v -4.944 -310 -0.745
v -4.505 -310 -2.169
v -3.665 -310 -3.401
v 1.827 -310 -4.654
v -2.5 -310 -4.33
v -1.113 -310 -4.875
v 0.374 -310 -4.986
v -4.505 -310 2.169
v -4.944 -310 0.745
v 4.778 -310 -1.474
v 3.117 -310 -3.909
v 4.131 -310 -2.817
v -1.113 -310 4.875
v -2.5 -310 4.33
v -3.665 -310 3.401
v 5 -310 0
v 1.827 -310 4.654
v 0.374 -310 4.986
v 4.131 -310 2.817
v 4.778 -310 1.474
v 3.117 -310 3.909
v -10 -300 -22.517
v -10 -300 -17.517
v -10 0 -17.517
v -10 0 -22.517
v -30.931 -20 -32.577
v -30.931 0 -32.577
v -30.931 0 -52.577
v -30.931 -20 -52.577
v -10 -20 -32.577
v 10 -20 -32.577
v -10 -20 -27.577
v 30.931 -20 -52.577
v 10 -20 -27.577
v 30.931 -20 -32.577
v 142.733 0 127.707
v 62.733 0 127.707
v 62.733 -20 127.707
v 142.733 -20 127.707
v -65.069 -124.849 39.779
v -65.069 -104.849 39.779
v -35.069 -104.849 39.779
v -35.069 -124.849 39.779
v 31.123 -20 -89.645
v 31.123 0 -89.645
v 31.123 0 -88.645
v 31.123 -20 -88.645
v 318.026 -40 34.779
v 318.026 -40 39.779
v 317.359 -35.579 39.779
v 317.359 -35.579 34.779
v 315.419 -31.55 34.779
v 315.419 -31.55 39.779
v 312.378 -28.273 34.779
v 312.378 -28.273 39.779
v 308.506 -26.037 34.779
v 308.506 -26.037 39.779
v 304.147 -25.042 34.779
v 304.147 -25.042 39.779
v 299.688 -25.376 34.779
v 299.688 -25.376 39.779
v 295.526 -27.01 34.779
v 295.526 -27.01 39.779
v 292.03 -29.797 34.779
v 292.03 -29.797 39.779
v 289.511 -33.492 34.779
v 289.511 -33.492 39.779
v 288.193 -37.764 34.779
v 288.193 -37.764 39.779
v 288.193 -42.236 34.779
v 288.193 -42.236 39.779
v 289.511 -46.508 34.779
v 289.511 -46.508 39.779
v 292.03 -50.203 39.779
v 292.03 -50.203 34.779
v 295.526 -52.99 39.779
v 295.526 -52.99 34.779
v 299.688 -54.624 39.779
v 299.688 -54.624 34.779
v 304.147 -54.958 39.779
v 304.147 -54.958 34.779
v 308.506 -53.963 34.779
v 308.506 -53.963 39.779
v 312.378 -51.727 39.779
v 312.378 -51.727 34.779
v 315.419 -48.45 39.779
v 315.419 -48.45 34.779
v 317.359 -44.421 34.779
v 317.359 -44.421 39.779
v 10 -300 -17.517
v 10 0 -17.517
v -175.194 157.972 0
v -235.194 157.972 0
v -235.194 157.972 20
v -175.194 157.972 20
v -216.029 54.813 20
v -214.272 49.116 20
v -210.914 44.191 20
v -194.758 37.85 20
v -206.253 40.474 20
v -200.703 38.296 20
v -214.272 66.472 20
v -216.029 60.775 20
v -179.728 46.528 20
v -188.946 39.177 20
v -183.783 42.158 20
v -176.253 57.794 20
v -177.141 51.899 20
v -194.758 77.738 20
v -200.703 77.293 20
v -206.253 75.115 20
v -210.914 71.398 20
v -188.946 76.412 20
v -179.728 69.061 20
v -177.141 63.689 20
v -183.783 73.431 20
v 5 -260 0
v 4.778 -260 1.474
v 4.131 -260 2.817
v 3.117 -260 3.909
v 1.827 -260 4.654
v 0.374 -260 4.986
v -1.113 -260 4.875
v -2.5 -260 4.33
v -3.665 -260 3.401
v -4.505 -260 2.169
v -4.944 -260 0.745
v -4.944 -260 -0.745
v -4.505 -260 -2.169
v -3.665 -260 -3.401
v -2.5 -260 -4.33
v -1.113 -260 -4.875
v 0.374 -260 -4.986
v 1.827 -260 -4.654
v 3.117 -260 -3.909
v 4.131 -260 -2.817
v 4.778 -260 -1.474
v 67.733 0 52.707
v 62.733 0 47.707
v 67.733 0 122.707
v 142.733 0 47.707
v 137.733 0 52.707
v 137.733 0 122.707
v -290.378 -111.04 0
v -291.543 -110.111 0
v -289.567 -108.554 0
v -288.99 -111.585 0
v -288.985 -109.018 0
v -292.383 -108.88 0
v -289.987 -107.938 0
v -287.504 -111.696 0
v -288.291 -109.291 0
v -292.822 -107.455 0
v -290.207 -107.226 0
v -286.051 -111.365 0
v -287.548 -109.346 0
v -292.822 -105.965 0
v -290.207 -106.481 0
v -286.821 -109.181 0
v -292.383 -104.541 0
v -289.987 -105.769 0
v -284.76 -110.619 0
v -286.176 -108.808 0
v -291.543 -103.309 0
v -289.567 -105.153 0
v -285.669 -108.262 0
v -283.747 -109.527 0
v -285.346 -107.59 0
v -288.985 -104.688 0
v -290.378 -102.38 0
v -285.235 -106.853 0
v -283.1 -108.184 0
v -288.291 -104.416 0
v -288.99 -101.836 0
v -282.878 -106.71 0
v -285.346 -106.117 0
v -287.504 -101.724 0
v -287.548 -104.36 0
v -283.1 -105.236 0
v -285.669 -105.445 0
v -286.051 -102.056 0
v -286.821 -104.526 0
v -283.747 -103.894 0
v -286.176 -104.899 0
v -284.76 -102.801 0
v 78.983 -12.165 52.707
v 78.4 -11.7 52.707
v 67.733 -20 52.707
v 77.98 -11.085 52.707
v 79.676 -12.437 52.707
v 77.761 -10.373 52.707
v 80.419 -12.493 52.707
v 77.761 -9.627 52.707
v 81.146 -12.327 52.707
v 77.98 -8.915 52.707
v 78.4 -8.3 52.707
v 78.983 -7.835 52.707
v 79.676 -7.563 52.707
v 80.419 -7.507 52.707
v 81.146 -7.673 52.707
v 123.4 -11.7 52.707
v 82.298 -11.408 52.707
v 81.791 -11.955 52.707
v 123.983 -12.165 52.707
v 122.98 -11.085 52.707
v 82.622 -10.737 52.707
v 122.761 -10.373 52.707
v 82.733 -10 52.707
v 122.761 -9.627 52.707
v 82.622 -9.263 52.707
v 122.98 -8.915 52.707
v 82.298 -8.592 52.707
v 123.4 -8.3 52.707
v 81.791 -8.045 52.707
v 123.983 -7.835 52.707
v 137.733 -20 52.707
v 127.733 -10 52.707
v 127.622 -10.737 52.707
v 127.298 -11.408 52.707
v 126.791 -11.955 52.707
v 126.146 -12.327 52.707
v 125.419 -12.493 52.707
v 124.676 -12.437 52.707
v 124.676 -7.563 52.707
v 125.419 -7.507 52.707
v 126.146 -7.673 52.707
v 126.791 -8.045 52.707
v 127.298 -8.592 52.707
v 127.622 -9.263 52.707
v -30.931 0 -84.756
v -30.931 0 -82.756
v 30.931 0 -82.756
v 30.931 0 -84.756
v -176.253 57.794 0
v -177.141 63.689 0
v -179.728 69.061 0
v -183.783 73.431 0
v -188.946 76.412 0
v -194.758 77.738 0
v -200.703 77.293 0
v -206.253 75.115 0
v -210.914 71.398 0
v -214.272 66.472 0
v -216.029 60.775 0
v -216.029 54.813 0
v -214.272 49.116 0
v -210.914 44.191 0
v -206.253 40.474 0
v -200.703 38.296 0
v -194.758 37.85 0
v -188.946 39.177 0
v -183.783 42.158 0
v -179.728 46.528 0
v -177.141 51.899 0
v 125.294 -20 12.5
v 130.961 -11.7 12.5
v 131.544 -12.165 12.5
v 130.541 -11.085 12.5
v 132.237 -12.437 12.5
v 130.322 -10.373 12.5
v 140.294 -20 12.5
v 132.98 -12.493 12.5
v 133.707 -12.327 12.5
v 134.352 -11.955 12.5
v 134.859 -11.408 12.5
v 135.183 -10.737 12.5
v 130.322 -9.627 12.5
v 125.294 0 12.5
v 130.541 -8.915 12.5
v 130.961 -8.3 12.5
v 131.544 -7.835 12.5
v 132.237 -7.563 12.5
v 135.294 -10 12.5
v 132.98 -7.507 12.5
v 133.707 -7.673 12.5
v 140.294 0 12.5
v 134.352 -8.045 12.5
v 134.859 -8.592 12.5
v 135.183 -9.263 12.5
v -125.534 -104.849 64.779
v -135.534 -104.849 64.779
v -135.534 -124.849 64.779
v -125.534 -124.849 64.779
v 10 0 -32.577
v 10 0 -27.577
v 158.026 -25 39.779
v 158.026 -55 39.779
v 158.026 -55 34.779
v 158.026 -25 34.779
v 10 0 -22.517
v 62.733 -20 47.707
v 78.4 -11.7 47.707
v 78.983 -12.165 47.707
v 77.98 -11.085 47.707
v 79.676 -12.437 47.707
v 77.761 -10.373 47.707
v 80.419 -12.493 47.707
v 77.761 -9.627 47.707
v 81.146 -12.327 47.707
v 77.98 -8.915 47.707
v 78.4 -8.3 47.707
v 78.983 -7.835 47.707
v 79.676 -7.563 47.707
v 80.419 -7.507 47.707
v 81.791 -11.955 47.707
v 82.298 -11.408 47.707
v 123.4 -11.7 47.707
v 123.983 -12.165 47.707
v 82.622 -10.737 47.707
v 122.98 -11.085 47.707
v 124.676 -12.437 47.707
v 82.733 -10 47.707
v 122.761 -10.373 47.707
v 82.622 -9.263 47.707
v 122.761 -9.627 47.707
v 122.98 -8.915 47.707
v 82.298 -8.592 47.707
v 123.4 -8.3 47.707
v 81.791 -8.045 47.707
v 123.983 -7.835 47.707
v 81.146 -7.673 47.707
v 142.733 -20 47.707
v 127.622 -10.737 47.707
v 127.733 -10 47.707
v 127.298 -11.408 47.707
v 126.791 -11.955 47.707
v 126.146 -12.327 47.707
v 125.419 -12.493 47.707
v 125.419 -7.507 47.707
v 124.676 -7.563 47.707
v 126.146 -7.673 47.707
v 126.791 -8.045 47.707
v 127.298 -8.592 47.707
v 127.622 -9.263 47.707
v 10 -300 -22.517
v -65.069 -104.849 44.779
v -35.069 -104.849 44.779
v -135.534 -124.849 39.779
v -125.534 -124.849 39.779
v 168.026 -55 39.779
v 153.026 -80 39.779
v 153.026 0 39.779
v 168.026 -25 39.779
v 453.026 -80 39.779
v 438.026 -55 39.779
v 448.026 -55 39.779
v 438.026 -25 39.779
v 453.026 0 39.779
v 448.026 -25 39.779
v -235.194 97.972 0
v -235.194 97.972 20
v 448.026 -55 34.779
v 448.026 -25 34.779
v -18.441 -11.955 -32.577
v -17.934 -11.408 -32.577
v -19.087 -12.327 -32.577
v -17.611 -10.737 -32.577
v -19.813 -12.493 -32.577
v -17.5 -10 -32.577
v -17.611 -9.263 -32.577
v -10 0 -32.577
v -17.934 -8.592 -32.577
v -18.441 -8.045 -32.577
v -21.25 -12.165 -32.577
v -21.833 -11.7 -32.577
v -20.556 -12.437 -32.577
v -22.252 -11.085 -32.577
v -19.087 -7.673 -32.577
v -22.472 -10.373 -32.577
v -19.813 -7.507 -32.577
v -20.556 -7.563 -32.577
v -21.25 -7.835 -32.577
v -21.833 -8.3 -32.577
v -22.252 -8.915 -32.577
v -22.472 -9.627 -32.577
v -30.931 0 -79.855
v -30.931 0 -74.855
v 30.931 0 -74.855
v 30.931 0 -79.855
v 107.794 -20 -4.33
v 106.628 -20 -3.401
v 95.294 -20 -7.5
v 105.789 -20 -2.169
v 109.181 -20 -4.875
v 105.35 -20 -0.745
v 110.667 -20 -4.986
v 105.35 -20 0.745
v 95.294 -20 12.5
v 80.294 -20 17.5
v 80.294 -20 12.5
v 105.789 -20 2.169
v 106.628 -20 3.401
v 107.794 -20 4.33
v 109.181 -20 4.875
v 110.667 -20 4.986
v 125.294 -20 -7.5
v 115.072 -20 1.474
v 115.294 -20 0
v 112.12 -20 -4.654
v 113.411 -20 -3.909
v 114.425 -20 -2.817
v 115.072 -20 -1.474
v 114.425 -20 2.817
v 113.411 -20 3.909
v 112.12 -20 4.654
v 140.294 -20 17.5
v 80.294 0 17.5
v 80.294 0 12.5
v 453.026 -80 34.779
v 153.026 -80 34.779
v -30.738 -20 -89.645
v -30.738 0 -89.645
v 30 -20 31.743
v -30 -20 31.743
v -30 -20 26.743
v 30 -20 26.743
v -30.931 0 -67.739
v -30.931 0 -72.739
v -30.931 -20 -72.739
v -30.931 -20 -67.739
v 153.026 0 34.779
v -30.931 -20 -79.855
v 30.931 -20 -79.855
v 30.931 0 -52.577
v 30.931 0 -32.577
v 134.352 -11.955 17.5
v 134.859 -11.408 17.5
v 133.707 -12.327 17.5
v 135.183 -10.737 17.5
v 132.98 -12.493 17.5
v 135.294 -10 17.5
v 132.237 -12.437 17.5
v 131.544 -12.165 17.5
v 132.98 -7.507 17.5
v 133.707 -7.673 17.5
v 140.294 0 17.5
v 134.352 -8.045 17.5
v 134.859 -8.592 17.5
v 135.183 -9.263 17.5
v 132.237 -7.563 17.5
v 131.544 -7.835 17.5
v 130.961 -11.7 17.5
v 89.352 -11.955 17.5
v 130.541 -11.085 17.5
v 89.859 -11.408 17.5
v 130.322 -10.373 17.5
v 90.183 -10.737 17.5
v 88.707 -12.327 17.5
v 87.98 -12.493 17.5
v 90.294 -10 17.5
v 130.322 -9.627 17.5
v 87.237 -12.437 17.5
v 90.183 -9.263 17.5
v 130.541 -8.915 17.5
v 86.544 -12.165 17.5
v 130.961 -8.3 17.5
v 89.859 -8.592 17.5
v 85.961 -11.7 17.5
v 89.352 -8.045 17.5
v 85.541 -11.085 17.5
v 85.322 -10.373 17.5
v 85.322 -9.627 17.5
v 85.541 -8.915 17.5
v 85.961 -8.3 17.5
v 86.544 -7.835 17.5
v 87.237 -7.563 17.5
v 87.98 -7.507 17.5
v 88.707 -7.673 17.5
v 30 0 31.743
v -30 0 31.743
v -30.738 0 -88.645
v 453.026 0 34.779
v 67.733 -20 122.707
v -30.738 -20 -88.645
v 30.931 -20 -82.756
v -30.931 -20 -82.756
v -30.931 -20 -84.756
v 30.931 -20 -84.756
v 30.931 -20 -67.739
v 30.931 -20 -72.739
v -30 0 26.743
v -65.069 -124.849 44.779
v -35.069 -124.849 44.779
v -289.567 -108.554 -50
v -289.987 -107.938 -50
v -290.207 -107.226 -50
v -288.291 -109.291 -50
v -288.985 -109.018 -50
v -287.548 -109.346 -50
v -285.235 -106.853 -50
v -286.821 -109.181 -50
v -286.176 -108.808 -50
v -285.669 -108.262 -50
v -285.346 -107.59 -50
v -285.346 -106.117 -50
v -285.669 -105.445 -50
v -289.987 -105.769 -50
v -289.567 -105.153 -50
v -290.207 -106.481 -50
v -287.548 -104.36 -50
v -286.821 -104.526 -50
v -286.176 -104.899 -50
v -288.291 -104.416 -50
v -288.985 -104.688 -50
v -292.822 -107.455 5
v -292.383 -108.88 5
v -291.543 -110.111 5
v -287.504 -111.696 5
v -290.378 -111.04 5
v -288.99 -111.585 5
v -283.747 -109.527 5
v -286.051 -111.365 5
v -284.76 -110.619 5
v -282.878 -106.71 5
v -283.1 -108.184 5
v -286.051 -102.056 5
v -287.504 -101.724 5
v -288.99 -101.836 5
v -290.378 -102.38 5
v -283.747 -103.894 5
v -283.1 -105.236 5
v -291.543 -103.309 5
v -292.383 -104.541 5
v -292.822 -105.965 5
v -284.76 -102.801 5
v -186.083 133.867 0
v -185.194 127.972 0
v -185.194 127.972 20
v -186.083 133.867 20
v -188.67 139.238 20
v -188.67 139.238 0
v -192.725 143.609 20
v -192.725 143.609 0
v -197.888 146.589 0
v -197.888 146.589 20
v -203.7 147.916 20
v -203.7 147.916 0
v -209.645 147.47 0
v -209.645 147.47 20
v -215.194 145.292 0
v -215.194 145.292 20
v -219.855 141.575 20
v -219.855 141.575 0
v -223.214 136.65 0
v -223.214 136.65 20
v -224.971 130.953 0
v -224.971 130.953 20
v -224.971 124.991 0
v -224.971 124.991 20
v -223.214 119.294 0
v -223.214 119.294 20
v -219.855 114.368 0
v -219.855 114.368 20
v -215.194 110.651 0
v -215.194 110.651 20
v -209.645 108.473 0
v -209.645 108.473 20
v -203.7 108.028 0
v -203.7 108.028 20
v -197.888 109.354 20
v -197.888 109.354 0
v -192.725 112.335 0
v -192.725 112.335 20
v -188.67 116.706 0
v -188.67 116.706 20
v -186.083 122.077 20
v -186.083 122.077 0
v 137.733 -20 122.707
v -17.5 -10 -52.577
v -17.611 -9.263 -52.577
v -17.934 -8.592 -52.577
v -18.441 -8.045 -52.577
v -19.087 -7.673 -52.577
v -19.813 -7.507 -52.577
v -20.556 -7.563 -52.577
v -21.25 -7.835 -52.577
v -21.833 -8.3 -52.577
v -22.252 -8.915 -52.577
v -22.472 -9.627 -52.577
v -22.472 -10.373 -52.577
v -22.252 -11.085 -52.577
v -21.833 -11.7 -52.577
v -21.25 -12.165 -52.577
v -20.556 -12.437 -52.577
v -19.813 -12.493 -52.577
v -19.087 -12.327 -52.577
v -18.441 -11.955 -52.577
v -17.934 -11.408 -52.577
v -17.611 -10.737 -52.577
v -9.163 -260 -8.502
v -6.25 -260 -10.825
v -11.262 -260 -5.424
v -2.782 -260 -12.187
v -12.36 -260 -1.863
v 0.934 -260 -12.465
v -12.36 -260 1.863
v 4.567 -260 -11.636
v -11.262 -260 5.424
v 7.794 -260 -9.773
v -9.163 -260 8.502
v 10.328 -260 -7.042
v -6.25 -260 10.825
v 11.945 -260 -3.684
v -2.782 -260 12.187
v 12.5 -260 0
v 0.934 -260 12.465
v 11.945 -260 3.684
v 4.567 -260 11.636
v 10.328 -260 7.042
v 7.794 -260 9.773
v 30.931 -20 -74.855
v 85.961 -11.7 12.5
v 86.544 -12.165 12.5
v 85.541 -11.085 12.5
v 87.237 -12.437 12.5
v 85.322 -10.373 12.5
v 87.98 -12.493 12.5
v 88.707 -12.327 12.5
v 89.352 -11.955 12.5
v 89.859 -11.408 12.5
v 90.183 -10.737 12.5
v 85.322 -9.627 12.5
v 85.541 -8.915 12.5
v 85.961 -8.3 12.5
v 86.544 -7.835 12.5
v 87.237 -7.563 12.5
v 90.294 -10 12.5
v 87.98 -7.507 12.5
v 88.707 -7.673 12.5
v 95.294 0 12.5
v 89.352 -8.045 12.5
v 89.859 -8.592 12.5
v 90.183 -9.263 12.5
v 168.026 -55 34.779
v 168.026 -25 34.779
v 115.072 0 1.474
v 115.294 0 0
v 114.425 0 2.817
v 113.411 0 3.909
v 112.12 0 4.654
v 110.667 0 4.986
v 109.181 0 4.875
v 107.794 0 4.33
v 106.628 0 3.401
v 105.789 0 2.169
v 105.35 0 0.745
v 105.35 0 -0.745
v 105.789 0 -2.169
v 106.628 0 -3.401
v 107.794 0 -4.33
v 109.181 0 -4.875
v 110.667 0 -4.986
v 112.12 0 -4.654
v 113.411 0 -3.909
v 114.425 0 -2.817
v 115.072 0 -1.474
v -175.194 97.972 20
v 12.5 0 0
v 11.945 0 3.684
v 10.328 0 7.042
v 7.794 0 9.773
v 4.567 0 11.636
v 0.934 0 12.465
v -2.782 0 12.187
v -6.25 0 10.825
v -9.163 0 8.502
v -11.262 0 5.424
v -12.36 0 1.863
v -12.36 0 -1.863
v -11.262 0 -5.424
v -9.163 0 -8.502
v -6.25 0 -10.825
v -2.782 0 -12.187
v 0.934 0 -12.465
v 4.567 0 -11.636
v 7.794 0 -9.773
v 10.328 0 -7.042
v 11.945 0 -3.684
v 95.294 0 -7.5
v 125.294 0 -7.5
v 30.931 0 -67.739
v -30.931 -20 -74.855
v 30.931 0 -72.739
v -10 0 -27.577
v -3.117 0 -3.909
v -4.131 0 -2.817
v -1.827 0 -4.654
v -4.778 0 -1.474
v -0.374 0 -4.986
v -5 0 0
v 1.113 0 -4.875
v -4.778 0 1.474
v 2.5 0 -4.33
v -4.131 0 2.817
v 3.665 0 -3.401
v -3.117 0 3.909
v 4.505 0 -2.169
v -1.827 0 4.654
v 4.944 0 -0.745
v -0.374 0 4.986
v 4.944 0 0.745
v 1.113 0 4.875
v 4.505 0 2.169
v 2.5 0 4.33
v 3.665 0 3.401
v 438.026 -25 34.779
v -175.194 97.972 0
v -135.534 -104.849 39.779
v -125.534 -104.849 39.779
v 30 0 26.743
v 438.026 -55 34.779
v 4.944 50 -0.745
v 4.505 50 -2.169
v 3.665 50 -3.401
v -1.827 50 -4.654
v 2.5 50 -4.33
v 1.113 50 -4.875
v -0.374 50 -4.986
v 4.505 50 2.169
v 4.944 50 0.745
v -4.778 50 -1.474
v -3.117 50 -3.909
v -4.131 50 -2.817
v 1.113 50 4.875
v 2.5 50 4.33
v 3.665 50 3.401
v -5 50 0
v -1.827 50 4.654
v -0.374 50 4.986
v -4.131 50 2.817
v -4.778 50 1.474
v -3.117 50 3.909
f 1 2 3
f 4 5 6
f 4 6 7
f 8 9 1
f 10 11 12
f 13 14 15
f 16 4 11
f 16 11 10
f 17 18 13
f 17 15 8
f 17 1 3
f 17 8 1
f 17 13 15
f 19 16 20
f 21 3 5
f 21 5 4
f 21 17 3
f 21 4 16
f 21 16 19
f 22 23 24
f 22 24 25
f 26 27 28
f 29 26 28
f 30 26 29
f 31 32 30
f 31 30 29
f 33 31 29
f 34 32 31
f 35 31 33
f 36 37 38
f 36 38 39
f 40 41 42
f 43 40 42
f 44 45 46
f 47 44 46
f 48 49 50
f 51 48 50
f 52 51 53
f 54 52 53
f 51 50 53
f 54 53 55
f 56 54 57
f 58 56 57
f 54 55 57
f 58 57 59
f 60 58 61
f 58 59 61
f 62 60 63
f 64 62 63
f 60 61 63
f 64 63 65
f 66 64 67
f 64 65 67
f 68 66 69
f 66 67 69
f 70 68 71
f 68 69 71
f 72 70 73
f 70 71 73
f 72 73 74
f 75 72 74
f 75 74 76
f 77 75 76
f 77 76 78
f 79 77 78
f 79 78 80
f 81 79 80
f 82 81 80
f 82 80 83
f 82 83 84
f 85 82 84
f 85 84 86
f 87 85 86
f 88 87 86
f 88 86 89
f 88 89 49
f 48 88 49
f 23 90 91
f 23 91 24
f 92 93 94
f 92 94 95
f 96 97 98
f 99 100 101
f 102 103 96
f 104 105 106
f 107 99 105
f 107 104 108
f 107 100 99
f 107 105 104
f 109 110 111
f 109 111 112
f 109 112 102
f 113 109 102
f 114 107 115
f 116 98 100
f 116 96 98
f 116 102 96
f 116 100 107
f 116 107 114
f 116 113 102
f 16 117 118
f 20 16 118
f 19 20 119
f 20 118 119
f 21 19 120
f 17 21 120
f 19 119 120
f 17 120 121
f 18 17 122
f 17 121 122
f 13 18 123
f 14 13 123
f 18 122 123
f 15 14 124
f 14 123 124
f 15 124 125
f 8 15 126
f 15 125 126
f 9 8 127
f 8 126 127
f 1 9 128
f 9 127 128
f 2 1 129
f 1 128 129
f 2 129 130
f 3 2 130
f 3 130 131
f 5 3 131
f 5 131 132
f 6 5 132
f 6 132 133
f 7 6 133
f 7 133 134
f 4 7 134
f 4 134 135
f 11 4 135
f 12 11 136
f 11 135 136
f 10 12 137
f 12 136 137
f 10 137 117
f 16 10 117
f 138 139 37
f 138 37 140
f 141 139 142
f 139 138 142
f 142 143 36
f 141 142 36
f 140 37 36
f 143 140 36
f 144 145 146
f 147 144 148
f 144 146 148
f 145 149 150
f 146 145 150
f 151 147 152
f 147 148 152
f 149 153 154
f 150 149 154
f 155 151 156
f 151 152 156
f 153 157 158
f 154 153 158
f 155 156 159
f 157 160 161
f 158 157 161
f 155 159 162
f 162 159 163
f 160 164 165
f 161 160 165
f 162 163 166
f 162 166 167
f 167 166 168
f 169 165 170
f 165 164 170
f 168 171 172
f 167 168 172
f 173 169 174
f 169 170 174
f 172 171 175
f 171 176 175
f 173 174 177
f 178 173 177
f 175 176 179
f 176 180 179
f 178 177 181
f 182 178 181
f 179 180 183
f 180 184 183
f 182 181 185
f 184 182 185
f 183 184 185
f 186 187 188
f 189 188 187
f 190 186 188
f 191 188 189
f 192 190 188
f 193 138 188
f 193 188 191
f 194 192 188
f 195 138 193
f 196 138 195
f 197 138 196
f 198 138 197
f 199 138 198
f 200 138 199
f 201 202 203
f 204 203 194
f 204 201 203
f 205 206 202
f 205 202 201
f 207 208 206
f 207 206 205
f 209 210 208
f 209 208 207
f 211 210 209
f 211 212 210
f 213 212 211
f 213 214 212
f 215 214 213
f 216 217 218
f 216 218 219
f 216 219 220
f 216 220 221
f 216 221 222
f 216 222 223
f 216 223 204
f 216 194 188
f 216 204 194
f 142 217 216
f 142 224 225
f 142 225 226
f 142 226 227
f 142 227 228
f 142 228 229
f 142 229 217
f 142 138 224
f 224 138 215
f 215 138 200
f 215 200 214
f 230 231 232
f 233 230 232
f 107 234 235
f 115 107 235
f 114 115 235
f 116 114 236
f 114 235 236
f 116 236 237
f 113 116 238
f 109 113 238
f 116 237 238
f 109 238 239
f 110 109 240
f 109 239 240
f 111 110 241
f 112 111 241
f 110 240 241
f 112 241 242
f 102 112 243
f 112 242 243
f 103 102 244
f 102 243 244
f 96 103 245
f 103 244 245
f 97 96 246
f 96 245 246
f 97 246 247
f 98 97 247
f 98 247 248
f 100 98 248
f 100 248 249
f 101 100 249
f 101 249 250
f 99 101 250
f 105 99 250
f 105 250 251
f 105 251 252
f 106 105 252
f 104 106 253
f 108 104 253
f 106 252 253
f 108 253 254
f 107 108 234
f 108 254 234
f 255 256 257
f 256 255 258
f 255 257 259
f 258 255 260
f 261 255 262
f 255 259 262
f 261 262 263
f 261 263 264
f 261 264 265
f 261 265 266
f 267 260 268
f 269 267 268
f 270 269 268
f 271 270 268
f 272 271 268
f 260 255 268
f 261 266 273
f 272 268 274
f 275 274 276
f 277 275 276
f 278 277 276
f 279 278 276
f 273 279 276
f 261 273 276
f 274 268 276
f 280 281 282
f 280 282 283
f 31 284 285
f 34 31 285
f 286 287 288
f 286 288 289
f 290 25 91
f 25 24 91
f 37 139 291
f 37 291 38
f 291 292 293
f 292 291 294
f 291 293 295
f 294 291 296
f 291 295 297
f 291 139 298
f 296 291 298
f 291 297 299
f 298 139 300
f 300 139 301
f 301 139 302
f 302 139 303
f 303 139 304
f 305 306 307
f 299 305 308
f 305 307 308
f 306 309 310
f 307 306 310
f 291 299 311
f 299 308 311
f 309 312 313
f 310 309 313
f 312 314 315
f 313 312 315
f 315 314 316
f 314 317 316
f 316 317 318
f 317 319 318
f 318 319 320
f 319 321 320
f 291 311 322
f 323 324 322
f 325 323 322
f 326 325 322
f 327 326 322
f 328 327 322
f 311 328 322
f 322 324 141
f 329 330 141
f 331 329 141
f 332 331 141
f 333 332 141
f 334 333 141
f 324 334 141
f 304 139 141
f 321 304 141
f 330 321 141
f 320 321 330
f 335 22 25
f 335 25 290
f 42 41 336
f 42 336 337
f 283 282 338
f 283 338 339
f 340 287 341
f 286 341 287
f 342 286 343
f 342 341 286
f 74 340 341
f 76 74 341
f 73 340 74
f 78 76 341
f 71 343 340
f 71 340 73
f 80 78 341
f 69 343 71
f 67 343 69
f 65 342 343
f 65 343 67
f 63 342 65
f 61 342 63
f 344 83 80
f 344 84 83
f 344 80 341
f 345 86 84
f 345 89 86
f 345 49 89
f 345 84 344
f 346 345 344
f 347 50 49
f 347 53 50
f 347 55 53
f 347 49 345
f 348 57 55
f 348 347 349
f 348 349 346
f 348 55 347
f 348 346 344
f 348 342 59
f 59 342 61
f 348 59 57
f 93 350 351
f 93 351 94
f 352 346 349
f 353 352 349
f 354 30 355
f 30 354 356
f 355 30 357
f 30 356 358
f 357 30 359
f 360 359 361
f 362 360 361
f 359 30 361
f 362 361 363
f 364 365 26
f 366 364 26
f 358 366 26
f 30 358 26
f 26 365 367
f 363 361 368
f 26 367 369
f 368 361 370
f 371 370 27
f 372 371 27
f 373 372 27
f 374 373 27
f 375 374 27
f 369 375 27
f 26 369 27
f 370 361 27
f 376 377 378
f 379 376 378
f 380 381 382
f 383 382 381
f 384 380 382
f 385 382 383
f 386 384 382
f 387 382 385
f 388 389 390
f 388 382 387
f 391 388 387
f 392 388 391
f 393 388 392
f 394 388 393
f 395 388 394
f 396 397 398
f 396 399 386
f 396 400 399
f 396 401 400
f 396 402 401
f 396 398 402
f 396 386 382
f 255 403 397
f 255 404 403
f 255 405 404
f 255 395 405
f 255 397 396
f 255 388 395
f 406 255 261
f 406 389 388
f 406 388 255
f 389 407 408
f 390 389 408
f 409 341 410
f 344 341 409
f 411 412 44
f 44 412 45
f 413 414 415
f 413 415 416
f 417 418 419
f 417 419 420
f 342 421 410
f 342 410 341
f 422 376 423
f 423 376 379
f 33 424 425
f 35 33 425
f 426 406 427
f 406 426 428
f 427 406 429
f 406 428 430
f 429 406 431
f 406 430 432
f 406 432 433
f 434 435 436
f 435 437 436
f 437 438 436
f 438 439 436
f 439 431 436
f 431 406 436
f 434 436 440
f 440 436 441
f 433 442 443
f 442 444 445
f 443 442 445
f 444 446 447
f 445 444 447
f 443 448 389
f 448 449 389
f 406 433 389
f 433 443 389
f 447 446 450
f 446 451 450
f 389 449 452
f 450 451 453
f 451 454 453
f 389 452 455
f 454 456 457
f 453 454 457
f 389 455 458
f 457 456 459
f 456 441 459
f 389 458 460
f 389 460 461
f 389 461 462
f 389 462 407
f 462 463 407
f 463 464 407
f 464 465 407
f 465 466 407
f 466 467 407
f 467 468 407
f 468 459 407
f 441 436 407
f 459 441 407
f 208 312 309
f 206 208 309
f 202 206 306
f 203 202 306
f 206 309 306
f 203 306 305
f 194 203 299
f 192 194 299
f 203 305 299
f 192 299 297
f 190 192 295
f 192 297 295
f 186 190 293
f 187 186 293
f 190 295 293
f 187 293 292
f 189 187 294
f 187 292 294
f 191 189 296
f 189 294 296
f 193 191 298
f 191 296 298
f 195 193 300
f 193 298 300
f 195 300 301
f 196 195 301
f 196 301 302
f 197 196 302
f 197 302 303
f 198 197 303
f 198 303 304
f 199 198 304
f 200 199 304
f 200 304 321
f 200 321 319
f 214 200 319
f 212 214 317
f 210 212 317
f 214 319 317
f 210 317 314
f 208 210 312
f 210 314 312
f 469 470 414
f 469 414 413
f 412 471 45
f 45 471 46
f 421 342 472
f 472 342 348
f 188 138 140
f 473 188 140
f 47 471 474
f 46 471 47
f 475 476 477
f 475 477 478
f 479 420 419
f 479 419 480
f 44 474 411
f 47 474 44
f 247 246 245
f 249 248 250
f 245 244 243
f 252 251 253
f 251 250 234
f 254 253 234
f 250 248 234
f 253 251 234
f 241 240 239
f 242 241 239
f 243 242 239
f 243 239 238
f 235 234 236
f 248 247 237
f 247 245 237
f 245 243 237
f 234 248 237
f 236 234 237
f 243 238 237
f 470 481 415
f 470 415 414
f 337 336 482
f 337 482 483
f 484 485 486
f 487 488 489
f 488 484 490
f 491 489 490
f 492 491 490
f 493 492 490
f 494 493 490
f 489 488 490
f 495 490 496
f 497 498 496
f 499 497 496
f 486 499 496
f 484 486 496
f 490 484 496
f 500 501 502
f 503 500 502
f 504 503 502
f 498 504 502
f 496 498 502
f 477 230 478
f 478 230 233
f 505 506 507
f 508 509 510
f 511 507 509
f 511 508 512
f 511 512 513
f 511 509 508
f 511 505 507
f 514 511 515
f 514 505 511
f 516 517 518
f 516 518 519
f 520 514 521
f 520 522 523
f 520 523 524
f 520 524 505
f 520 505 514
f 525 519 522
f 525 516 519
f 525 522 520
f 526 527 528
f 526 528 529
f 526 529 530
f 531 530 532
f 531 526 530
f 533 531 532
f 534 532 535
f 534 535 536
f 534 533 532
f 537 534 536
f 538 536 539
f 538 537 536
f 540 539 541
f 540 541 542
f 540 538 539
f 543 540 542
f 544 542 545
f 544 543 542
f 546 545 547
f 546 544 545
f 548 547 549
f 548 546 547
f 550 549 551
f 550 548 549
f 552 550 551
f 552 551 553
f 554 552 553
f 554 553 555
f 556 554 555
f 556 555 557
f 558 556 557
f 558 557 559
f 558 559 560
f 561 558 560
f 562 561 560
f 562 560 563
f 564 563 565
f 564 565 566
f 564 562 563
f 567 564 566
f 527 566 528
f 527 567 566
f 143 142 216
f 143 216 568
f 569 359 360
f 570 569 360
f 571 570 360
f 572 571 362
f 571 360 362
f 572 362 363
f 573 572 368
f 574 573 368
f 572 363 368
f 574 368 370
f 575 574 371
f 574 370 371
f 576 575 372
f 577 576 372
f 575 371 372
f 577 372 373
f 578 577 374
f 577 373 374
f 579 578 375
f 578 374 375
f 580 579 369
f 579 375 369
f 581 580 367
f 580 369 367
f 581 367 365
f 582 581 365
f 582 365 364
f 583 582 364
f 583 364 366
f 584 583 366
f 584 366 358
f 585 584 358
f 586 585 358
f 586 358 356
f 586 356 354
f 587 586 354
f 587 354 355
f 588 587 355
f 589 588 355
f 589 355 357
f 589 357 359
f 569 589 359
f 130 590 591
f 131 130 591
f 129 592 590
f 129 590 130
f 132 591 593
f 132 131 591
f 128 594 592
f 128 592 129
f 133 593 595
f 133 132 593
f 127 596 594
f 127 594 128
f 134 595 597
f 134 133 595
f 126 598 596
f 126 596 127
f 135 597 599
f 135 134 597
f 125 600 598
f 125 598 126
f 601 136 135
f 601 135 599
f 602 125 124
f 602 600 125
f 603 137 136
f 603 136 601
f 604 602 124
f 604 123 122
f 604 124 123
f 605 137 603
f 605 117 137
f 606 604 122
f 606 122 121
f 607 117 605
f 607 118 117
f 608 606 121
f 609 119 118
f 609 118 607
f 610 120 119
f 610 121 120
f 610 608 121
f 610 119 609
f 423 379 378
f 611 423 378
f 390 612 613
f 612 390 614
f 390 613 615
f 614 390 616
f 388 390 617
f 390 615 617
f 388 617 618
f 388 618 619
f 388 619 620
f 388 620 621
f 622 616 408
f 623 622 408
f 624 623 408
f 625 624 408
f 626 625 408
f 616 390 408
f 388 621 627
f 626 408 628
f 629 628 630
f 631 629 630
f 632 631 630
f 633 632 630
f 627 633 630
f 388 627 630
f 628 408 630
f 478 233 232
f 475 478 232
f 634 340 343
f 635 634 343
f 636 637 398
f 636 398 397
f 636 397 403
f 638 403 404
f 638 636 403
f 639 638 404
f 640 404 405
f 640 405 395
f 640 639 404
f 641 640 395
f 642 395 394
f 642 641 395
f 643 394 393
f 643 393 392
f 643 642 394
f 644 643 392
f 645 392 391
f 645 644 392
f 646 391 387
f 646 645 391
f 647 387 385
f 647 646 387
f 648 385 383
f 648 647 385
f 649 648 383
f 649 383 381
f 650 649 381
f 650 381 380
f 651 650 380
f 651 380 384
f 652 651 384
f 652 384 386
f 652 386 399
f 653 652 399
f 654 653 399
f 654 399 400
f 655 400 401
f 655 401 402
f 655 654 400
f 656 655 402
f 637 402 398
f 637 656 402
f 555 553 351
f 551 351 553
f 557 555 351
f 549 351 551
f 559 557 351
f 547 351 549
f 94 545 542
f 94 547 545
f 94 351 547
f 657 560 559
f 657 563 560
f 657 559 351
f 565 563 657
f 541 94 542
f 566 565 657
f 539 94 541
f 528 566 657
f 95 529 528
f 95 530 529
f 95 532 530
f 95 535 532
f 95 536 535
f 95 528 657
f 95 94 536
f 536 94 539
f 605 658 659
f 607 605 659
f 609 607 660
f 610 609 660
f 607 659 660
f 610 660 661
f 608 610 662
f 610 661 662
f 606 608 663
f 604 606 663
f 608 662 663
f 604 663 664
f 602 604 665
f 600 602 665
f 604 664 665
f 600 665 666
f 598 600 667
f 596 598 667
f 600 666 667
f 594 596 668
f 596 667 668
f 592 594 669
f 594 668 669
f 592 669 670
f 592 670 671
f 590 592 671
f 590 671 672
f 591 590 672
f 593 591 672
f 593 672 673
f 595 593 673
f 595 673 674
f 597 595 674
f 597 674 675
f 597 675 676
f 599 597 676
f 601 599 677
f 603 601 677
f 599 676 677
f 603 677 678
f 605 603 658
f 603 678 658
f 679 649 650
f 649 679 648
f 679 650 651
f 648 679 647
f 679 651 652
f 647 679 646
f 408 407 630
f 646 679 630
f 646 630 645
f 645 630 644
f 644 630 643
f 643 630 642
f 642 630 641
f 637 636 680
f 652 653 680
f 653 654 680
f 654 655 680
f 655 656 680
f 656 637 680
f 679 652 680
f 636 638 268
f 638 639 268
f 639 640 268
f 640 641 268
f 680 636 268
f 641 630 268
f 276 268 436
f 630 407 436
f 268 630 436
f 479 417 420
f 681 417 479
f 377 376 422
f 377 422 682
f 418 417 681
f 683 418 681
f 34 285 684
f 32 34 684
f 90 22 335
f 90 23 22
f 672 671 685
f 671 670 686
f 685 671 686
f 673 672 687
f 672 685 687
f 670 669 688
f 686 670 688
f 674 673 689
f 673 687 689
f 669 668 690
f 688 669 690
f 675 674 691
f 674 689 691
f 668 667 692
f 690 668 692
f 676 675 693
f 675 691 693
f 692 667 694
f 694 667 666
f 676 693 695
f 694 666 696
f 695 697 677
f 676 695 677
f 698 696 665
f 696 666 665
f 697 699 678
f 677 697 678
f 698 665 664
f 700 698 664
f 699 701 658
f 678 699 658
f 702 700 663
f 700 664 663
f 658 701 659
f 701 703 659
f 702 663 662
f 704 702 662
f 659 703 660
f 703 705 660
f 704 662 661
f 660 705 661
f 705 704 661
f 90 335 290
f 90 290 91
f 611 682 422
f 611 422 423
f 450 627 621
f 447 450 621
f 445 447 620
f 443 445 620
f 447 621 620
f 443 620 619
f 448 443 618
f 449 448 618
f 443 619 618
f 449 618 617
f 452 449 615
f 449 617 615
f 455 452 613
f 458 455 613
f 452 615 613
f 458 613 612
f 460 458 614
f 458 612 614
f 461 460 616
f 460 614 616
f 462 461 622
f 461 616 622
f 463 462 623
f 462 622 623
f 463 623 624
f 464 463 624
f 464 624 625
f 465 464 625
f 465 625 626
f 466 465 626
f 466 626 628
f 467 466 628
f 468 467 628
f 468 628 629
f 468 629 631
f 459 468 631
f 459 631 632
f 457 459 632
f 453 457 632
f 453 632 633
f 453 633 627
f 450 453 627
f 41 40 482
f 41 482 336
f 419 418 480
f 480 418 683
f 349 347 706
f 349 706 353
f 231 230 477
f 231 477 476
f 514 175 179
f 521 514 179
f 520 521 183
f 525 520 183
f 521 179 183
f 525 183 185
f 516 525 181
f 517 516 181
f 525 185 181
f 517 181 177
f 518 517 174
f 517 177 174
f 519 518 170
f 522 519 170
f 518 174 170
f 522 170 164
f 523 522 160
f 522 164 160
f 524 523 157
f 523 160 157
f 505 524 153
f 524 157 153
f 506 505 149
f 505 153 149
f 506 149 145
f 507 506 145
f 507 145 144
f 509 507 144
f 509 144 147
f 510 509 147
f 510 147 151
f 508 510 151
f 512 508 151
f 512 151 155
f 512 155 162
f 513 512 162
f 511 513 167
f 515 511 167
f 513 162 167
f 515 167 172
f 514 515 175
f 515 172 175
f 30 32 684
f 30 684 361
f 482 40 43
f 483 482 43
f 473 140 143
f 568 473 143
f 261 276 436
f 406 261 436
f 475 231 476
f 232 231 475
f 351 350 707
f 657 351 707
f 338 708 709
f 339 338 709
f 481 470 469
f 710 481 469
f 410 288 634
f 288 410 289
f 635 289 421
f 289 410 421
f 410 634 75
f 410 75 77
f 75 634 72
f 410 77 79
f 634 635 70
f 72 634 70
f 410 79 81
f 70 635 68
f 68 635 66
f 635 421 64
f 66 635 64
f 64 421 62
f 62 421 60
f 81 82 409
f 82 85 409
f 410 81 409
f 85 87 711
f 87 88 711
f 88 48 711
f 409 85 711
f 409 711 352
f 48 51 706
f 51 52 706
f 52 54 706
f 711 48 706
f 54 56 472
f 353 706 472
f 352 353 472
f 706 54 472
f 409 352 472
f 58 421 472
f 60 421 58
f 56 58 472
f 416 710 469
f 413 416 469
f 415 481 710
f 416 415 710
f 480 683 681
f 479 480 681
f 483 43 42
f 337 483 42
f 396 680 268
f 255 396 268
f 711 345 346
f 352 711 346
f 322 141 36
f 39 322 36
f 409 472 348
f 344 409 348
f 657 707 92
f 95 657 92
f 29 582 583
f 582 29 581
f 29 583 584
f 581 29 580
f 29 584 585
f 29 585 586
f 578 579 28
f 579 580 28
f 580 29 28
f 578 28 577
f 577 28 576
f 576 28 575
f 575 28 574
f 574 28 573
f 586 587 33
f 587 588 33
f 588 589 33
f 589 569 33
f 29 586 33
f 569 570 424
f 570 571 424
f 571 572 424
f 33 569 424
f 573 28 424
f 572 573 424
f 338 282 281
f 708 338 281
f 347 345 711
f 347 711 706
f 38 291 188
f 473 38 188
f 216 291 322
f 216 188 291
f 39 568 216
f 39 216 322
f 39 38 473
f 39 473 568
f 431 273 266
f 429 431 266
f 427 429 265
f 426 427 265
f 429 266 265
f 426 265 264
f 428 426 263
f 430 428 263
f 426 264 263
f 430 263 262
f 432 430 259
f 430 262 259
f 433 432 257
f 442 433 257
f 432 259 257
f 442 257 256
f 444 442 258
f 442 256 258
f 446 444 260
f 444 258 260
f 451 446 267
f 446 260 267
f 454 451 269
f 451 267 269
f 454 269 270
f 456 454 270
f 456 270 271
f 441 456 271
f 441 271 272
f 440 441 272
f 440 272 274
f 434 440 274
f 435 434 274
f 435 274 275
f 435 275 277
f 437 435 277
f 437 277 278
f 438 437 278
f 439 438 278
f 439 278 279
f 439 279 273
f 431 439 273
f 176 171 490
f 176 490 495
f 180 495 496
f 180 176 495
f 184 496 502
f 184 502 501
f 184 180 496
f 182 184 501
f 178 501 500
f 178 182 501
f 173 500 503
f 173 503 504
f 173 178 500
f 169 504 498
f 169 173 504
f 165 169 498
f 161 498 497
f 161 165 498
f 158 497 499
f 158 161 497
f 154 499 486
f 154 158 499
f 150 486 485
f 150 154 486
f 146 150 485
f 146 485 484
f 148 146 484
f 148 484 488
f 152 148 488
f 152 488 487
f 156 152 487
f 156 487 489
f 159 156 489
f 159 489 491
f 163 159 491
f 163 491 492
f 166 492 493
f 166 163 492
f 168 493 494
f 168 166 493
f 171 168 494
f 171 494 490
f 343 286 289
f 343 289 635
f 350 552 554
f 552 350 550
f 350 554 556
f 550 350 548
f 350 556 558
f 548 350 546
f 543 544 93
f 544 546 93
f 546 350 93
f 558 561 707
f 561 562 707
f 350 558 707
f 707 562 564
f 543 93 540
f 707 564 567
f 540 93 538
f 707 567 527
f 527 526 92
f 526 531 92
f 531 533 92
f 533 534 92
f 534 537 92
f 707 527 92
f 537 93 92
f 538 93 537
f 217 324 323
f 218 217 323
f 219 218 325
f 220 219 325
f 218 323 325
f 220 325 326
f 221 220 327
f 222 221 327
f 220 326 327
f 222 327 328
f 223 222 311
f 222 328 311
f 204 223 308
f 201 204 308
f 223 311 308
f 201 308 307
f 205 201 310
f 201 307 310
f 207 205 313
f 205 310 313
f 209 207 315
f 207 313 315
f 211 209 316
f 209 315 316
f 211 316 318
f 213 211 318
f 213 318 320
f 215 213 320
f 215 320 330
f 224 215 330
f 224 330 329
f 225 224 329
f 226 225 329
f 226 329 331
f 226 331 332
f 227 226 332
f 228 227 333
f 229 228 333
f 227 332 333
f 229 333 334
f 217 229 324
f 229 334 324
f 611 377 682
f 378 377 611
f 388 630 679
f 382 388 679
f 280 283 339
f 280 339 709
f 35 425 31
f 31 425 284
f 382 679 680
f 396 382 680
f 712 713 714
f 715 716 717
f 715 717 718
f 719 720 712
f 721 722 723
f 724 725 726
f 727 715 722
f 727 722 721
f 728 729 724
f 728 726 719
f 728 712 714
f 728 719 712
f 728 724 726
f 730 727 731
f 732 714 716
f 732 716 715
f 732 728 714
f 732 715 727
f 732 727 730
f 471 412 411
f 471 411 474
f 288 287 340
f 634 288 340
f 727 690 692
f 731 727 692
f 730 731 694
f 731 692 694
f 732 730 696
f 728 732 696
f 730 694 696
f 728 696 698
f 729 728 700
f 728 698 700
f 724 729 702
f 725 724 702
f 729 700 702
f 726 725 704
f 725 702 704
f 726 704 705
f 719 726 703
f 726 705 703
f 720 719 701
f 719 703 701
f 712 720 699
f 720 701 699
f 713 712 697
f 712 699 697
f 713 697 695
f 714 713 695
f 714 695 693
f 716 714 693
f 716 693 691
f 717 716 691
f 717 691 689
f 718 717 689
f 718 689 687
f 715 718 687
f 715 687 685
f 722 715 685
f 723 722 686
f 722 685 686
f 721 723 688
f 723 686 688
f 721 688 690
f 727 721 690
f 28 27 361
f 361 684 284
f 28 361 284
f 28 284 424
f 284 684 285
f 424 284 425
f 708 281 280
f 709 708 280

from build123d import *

# Parameters (mm, degrees)
F0_R      = 5
F1_DEPTH  = 20
F0_W      = 60
F0_H      = 5
F0_W_2    = 80
F0_H_2    = 80
F0_W_3    = 70
F0_H_3    = 70
F0_W_4    = 61.861140081
F0_H_4    = 1
F0_H_5    = 2
F0_R_2    = 12.5
F2_DEPTH  = 260
F3_R      = 5
F4_DEPTH  = 50
F5_DEPTH  = 300
F6_R      = 2.5
F7_DEPTH  = 25
F9_R      = 2.5
F8_R      = 2.5
F10_DEPTH = 25
F14_R     = 5
F15_DEPTH = 50
F16_W     = 300
F16_H     = 5
F17_DEPTH = 80
F19_R     = 20
F20_DEPTH = 20
F19_W     = 60
F19_H     = 60
F21_DEPTH = 20
F18_W     = 10
F18_H     = 30
F18_R     = 15
F22_DEPTH = 129.4251411048
F18_H_2   = 20
F23_DEPTH = 25
F18_W_2   = 30
F24_DEPTH = 5
F13_R     = 2.5
F25_DEPTH = 5
F26_R     = 5
F27_DEPTH = 5
F28_R     = 2.5
F29_DEPTH = 50


# Not quite as in the source:
# - a feature of the source that left no trace in its solid (it failed there, or was rolled back) is left out
# - a feature names something its author has since deleted; it is built from what else it names


with BuildPart() as f1:
    # F0 (on Front) → F1 (new body)
    with BuildSketch(Plane.XZ):
        Polygon((95.2936565876, -7.5), (110.2936565876, -7.5), (125.2936565876, -7.5), (125.2936565876, 12.5), (140.2936565876, 12.5), (140.2936565876, 17.5), (110.2936565876, 17.5), (80.2936565876, 17.5), (80.2936565876, 12.5), (95.2936565876, 12.5), align=None)
        with Locations((110.2936565876, 0)):
            Circle(F0_R, mode=Mode.SUBTRACT)
    extrude(amount=F1_DEPTH)

    # F9 (on face) + F8 (on face) → F10 (cut)
    with BuildSketch(Plane(origin=(0, 0, 12.5), x_dir=(1, 0, 0), z_dir=(0, 0, -1))):
        with Locations((87.7936565876, 10)):
            Circle(F9_R)
    with BuildSketch(Plane(origin=(0, 0, 12.5), x_dir=(1, 0, 0), z_dir=(0, 0, -1))):
        with Locations((132.7936565876, 10)):
            Circle(F8_R)
    extrude(amount=-F10_DEPTH, mode=Mode.SUBTRACT)


with BuildPart() as f1b:
    # F0 (on Front) → F1, piece 2 (new body)
    with BuildSketch(Plane.XZ):
        with Locations((0, 29.2427036911)):
            Rectangle(F0_W, F0_H)
    extrude(amount=F1_DEPTH)


with BuildPart() as f1c:
    # F0 (on Front) → F1, piece 3 (new body)
    with BuildSketch(Plane.XZ):
        Polygon((10, -27.5771580637), (0, -27.5771580637), (-10, -27.5771580637), (-10, -32.5771580637), (-10.9305700405, -32.5771580637), (-30.9305700405, -32.5771580637), (-30.9305700405, -52.5771580637), (0, -52.5771580637), (30.9305700405, -52.5771580637), (30.9305700405, -32.5771580637), (10.9305700405, -32.5771580637), (10, -32.5771580637), align=None)
    extrude(amount=F1_DEPTH)

    # F6 (on face) → F7 (cut)
    with BuildSketch(Plane.XY.offset(-32.5771580637)):
        with Locations((-20, -10)):
            Circle(F6_R)
    extrude(amount=-F7_DEPTH, mode=Mode.SUBTRACT)


with BuildPart() as f1d:
    # F0 (on Front) → F1, piece 4 (new body)
    with BuildSketch(Plane.XZ):
        with Locations((102.7326732874, 87.7068325877)):
            Rectangle(F0_W_2, F0_H_2)
        with Locations((102.7326732874, 87.7068325877)):
            Rectangle(F0_W_3, F0_H_3, mode=Mode.SUBTRACT)
    extrude(amount=F1_DEPTH)

    # F13 (on face) → F25 (cut, through all)
    with BuildSketch(Plane(origin=(0, 0, 47.7068325877), x_dir=(1, 0, 0), z_dir=(0, 0, -1))):
        with Locations((125.2326732874, 10)):
            Circle(F13_R)
        with Locations((80.2326732874, 10)):
            Circle(F13_R)
    extrude(amount=-F25_DEPTH, mode=Mode.SUBTRACT)


with BuildPart() as f1e:
    # F0 (on Front) → F1, piece 5 (new body)
    with BuildSketch(Plane.XZ):
        with Locations((0, -77.355325222)):
            Rectangle(F0_W_4, F0_H)
    extrude(amount=F1_DEPTH)


with BuildPart() as f1f:
    # F0 (on Front) → F1, piece 6 (new body)
    with BuildSketch(Plane.XZ):
        with Locations((0.1928325291, -89.1451310813)):
            Rectangle(F0_W_4, F0_H_4)
    extrude(amount=F1_DEPTH)


with BuildPart() as f1g:
    # F0 (on Front) → F1, piece 7 (new body)
    with BuildSketch(Plane.XZ):
        with Locations((0, -83.756296128)):
            Rectangle(F0_W_4, F0_H_5)
    extrude(amount=F1_DEPTH)


with BuildPart() as f1h:
    # F0 (on Front) → F1, piece 8 (new body)
    with BuildSketch(Plane.XZ):
        with Locations((0, -70.2389810979)):
            Rectangle(F0_W_4, F0_H)
    extrude(amount=F1_DEPTH)


with BuildPart() as f2:
    # F0 (on Front) → F2 (new body)
    with BuildSketch(Plane.XZ):
        Circle(F0_R_2)
    extrude(amount=F2_DEPTH)

    # F3 (on face) → F4 (join)
    with BuildSketch(Plane.XZ.offset(260)):
        Circle(F3_R)
    extrude(amount=F4_DEPTH)

    # F14 (on face) → F15 (join)
    with BuildSketch(Plane(origin=(0, 0, 0), x_dir=(-1, 0, 0), z_dir=(0, 1, 0))):
        Circle(F14_R)
    extrude(amount=F15_DEPTH)


with BuildPart() as f5:
    # F0 (on Front) → F5 (new body)
    with BuildSketch(Plane.XZ):
        Polygon((-10, -22.5167013705), (0, -22.5167013705), (10, -22.5167013705), (10, -17.5167013705), (0, -17.5167013705), (-10, -17.5167013705), align=None)
    extrude(amount=F5_DEPTH)


with BuildPart() as f17:
    # F16 (on Front) → F17 (new body)
    with BuildSketch(Plane.XZ):
        with Locations((303.0256081372, 37.2790100235)):
            Rectangle(F16_W, F16_H)
    extrude(amount=F17_DEPTH)

    # F18 (on face) → F22 (cut, through all)
    with BuildSketch(Plane.XY.offset(39.7790100235)):
        with Locations((163.0256081372, -40)):
            Rectangle(F18_W, F18_H)
        with Locations((443.0256081372, -40)):
            Rectangle(F18_W, F18_H)
        with Locations((303.0256081372, -40)):
            Circle(F18_R)
    extrude(amount=-F22_DEPTH, mode=Mode.SUBTRACT)


with BuildPart() as f20:
    # F19 (on Top) → F20 (new body)
    with BuildSketch(Plane.XY):
        with Locations((-196.2528675795, 57.794149965)):
            Circle(F19_R)
    extrude(amount=F20_DEPTH)


with BuildPart() as f21:
    # F19 (on Top) → F21 (new body)
    with BuildSketch(Plane.XY):
        with Locations((-205.1943850517, 127.9719012976)):
            Rectangle(F19_W, F19_H)
        with Locations((-205.1943850517, 127.9719012976)):
            Circle(F19_R, mode=Mode.SUBTRACT)
    extrude(amount=F21_DEPTH)


with BuildPart() as f23:
    # F18 (on face) → F23 (new body)
    with BuildSketch(Plane.XY.offset(39.7790100235)):
        with Locations((-130.5344802141, -114.8494374752)):
            Rectangle(F18_W, F18_H_2)
    extrude(amount=F23_DEPTH)


with BuildPart() as f24:
    # F18 (on face) → F24 (new body)
    with BuildSketch(Plane.XY.offset(39.7790100235)):
        with Locations((-50.0688782334, -114.8494374752)):
            Rectangle(F18_W_2, F18_H_2)
    extrude(amount=F24_DEPTH)


with BuildPart() as f27:
    # F26 (on Top) → F27 (new body)
    with BuildSketch(Plane.XY):
        with Locations((-287.8777384163, -106.7102653366)):
            Circle(F26_R)
    extrude(amount=F27_DEPTH)

    # F28 (on face) → F29 (join)
    with BuildSketch(Plane.XY):
        with Locations((-287.7346277237, -106.8533882499)):
            Circle(F28_R)
    extrude(amount=-F29_DEPTH)


solid = Compound([f1.part, f1b.part, f1c.part, f1d.part, f1e.part, f1f.part, f1g.part, f1h.part, f2.part, f5.part, f17.part, f20.part, f21.part, f23.part, f24.part, f27.part])
